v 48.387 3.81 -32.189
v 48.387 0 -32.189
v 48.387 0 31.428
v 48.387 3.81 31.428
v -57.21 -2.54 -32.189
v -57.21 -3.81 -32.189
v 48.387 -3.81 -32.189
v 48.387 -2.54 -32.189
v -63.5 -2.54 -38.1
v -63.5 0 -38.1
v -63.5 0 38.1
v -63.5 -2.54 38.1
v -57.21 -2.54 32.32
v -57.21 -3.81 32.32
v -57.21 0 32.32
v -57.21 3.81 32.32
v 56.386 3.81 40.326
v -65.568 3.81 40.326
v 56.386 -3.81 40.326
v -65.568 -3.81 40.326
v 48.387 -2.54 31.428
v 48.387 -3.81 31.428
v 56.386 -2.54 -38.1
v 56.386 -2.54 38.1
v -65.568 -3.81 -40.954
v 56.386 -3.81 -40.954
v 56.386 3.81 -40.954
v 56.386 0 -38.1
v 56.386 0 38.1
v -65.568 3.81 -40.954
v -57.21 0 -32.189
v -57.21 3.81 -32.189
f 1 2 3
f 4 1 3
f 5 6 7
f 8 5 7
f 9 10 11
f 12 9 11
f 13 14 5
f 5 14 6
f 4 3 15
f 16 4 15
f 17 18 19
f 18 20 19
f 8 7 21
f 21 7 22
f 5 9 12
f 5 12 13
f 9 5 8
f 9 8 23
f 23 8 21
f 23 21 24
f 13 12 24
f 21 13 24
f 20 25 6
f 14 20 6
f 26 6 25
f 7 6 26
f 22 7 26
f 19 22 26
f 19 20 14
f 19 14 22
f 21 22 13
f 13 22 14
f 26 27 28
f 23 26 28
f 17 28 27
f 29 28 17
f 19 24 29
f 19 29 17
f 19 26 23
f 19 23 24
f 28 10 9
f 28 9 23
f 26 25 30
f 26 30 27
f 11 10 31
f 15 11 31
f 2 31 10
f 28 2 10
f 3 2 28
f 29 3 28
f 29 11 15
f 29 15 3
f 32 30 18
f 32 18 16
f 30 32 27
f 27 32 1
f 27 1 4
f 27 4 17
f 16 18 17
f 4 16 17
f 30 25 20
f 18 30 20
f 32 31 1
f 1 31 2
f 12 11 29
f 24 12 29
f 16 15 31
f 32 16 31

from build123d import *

# Parameters (mm, degrees)
F0_W     = 127
F0_H     = 76.2
F1_DEPTH = 2.54
F2_W     = 121.95362
F2_H     = 81.28
F3_DEPTH = 3.81
F5_DEPTH = 25.4


with BuildPart() as f1:
    # F0 (on Front) → F1 (new body)
    with BuildSketch(Plane.XZ):
        Rectangle(F0_W, F0_H)
    extrude(amount=F1_DEPTH)


with BuildPart() as f3:
    # F2 (on Front) → F3 (new body, symmetric)
    with BuildSketch(Plane.XZ):
        with Locations((-4.591286, -0.313837)):
            Rectangle(F2_W, F2_H)
    extrude(amount=F3_DEPTH, both=True)


with BuildPart() as f5_tool:
    # F4 (on face) → F5 (new body)
    with BuildSketch(Plane.XZ.offset(3.81)):
        Polygon((48.386987, 31.428229), (-57.210241, 32.319993), (-57.210241, -32.189324), (48.386987, -32.189324), align=None)
    extrude(amount=-F5_DEPTH)


with BuildPart() as f1_1:
    add(f1.part)

    # F5: cut by f5_tool
    add(f5_tool.part, mode=Mode.SUBTRACT)


with BuildPart() as f3_1:
    add(f3.part)

    # F5: cut by f5_tool
    add(f5_tool.part, mode=Mode.SUBTRACT)

    # F6: cut F1
    add(f1_1.part, mode=Mode.SUBTRACT)


solid = f3_1.part
